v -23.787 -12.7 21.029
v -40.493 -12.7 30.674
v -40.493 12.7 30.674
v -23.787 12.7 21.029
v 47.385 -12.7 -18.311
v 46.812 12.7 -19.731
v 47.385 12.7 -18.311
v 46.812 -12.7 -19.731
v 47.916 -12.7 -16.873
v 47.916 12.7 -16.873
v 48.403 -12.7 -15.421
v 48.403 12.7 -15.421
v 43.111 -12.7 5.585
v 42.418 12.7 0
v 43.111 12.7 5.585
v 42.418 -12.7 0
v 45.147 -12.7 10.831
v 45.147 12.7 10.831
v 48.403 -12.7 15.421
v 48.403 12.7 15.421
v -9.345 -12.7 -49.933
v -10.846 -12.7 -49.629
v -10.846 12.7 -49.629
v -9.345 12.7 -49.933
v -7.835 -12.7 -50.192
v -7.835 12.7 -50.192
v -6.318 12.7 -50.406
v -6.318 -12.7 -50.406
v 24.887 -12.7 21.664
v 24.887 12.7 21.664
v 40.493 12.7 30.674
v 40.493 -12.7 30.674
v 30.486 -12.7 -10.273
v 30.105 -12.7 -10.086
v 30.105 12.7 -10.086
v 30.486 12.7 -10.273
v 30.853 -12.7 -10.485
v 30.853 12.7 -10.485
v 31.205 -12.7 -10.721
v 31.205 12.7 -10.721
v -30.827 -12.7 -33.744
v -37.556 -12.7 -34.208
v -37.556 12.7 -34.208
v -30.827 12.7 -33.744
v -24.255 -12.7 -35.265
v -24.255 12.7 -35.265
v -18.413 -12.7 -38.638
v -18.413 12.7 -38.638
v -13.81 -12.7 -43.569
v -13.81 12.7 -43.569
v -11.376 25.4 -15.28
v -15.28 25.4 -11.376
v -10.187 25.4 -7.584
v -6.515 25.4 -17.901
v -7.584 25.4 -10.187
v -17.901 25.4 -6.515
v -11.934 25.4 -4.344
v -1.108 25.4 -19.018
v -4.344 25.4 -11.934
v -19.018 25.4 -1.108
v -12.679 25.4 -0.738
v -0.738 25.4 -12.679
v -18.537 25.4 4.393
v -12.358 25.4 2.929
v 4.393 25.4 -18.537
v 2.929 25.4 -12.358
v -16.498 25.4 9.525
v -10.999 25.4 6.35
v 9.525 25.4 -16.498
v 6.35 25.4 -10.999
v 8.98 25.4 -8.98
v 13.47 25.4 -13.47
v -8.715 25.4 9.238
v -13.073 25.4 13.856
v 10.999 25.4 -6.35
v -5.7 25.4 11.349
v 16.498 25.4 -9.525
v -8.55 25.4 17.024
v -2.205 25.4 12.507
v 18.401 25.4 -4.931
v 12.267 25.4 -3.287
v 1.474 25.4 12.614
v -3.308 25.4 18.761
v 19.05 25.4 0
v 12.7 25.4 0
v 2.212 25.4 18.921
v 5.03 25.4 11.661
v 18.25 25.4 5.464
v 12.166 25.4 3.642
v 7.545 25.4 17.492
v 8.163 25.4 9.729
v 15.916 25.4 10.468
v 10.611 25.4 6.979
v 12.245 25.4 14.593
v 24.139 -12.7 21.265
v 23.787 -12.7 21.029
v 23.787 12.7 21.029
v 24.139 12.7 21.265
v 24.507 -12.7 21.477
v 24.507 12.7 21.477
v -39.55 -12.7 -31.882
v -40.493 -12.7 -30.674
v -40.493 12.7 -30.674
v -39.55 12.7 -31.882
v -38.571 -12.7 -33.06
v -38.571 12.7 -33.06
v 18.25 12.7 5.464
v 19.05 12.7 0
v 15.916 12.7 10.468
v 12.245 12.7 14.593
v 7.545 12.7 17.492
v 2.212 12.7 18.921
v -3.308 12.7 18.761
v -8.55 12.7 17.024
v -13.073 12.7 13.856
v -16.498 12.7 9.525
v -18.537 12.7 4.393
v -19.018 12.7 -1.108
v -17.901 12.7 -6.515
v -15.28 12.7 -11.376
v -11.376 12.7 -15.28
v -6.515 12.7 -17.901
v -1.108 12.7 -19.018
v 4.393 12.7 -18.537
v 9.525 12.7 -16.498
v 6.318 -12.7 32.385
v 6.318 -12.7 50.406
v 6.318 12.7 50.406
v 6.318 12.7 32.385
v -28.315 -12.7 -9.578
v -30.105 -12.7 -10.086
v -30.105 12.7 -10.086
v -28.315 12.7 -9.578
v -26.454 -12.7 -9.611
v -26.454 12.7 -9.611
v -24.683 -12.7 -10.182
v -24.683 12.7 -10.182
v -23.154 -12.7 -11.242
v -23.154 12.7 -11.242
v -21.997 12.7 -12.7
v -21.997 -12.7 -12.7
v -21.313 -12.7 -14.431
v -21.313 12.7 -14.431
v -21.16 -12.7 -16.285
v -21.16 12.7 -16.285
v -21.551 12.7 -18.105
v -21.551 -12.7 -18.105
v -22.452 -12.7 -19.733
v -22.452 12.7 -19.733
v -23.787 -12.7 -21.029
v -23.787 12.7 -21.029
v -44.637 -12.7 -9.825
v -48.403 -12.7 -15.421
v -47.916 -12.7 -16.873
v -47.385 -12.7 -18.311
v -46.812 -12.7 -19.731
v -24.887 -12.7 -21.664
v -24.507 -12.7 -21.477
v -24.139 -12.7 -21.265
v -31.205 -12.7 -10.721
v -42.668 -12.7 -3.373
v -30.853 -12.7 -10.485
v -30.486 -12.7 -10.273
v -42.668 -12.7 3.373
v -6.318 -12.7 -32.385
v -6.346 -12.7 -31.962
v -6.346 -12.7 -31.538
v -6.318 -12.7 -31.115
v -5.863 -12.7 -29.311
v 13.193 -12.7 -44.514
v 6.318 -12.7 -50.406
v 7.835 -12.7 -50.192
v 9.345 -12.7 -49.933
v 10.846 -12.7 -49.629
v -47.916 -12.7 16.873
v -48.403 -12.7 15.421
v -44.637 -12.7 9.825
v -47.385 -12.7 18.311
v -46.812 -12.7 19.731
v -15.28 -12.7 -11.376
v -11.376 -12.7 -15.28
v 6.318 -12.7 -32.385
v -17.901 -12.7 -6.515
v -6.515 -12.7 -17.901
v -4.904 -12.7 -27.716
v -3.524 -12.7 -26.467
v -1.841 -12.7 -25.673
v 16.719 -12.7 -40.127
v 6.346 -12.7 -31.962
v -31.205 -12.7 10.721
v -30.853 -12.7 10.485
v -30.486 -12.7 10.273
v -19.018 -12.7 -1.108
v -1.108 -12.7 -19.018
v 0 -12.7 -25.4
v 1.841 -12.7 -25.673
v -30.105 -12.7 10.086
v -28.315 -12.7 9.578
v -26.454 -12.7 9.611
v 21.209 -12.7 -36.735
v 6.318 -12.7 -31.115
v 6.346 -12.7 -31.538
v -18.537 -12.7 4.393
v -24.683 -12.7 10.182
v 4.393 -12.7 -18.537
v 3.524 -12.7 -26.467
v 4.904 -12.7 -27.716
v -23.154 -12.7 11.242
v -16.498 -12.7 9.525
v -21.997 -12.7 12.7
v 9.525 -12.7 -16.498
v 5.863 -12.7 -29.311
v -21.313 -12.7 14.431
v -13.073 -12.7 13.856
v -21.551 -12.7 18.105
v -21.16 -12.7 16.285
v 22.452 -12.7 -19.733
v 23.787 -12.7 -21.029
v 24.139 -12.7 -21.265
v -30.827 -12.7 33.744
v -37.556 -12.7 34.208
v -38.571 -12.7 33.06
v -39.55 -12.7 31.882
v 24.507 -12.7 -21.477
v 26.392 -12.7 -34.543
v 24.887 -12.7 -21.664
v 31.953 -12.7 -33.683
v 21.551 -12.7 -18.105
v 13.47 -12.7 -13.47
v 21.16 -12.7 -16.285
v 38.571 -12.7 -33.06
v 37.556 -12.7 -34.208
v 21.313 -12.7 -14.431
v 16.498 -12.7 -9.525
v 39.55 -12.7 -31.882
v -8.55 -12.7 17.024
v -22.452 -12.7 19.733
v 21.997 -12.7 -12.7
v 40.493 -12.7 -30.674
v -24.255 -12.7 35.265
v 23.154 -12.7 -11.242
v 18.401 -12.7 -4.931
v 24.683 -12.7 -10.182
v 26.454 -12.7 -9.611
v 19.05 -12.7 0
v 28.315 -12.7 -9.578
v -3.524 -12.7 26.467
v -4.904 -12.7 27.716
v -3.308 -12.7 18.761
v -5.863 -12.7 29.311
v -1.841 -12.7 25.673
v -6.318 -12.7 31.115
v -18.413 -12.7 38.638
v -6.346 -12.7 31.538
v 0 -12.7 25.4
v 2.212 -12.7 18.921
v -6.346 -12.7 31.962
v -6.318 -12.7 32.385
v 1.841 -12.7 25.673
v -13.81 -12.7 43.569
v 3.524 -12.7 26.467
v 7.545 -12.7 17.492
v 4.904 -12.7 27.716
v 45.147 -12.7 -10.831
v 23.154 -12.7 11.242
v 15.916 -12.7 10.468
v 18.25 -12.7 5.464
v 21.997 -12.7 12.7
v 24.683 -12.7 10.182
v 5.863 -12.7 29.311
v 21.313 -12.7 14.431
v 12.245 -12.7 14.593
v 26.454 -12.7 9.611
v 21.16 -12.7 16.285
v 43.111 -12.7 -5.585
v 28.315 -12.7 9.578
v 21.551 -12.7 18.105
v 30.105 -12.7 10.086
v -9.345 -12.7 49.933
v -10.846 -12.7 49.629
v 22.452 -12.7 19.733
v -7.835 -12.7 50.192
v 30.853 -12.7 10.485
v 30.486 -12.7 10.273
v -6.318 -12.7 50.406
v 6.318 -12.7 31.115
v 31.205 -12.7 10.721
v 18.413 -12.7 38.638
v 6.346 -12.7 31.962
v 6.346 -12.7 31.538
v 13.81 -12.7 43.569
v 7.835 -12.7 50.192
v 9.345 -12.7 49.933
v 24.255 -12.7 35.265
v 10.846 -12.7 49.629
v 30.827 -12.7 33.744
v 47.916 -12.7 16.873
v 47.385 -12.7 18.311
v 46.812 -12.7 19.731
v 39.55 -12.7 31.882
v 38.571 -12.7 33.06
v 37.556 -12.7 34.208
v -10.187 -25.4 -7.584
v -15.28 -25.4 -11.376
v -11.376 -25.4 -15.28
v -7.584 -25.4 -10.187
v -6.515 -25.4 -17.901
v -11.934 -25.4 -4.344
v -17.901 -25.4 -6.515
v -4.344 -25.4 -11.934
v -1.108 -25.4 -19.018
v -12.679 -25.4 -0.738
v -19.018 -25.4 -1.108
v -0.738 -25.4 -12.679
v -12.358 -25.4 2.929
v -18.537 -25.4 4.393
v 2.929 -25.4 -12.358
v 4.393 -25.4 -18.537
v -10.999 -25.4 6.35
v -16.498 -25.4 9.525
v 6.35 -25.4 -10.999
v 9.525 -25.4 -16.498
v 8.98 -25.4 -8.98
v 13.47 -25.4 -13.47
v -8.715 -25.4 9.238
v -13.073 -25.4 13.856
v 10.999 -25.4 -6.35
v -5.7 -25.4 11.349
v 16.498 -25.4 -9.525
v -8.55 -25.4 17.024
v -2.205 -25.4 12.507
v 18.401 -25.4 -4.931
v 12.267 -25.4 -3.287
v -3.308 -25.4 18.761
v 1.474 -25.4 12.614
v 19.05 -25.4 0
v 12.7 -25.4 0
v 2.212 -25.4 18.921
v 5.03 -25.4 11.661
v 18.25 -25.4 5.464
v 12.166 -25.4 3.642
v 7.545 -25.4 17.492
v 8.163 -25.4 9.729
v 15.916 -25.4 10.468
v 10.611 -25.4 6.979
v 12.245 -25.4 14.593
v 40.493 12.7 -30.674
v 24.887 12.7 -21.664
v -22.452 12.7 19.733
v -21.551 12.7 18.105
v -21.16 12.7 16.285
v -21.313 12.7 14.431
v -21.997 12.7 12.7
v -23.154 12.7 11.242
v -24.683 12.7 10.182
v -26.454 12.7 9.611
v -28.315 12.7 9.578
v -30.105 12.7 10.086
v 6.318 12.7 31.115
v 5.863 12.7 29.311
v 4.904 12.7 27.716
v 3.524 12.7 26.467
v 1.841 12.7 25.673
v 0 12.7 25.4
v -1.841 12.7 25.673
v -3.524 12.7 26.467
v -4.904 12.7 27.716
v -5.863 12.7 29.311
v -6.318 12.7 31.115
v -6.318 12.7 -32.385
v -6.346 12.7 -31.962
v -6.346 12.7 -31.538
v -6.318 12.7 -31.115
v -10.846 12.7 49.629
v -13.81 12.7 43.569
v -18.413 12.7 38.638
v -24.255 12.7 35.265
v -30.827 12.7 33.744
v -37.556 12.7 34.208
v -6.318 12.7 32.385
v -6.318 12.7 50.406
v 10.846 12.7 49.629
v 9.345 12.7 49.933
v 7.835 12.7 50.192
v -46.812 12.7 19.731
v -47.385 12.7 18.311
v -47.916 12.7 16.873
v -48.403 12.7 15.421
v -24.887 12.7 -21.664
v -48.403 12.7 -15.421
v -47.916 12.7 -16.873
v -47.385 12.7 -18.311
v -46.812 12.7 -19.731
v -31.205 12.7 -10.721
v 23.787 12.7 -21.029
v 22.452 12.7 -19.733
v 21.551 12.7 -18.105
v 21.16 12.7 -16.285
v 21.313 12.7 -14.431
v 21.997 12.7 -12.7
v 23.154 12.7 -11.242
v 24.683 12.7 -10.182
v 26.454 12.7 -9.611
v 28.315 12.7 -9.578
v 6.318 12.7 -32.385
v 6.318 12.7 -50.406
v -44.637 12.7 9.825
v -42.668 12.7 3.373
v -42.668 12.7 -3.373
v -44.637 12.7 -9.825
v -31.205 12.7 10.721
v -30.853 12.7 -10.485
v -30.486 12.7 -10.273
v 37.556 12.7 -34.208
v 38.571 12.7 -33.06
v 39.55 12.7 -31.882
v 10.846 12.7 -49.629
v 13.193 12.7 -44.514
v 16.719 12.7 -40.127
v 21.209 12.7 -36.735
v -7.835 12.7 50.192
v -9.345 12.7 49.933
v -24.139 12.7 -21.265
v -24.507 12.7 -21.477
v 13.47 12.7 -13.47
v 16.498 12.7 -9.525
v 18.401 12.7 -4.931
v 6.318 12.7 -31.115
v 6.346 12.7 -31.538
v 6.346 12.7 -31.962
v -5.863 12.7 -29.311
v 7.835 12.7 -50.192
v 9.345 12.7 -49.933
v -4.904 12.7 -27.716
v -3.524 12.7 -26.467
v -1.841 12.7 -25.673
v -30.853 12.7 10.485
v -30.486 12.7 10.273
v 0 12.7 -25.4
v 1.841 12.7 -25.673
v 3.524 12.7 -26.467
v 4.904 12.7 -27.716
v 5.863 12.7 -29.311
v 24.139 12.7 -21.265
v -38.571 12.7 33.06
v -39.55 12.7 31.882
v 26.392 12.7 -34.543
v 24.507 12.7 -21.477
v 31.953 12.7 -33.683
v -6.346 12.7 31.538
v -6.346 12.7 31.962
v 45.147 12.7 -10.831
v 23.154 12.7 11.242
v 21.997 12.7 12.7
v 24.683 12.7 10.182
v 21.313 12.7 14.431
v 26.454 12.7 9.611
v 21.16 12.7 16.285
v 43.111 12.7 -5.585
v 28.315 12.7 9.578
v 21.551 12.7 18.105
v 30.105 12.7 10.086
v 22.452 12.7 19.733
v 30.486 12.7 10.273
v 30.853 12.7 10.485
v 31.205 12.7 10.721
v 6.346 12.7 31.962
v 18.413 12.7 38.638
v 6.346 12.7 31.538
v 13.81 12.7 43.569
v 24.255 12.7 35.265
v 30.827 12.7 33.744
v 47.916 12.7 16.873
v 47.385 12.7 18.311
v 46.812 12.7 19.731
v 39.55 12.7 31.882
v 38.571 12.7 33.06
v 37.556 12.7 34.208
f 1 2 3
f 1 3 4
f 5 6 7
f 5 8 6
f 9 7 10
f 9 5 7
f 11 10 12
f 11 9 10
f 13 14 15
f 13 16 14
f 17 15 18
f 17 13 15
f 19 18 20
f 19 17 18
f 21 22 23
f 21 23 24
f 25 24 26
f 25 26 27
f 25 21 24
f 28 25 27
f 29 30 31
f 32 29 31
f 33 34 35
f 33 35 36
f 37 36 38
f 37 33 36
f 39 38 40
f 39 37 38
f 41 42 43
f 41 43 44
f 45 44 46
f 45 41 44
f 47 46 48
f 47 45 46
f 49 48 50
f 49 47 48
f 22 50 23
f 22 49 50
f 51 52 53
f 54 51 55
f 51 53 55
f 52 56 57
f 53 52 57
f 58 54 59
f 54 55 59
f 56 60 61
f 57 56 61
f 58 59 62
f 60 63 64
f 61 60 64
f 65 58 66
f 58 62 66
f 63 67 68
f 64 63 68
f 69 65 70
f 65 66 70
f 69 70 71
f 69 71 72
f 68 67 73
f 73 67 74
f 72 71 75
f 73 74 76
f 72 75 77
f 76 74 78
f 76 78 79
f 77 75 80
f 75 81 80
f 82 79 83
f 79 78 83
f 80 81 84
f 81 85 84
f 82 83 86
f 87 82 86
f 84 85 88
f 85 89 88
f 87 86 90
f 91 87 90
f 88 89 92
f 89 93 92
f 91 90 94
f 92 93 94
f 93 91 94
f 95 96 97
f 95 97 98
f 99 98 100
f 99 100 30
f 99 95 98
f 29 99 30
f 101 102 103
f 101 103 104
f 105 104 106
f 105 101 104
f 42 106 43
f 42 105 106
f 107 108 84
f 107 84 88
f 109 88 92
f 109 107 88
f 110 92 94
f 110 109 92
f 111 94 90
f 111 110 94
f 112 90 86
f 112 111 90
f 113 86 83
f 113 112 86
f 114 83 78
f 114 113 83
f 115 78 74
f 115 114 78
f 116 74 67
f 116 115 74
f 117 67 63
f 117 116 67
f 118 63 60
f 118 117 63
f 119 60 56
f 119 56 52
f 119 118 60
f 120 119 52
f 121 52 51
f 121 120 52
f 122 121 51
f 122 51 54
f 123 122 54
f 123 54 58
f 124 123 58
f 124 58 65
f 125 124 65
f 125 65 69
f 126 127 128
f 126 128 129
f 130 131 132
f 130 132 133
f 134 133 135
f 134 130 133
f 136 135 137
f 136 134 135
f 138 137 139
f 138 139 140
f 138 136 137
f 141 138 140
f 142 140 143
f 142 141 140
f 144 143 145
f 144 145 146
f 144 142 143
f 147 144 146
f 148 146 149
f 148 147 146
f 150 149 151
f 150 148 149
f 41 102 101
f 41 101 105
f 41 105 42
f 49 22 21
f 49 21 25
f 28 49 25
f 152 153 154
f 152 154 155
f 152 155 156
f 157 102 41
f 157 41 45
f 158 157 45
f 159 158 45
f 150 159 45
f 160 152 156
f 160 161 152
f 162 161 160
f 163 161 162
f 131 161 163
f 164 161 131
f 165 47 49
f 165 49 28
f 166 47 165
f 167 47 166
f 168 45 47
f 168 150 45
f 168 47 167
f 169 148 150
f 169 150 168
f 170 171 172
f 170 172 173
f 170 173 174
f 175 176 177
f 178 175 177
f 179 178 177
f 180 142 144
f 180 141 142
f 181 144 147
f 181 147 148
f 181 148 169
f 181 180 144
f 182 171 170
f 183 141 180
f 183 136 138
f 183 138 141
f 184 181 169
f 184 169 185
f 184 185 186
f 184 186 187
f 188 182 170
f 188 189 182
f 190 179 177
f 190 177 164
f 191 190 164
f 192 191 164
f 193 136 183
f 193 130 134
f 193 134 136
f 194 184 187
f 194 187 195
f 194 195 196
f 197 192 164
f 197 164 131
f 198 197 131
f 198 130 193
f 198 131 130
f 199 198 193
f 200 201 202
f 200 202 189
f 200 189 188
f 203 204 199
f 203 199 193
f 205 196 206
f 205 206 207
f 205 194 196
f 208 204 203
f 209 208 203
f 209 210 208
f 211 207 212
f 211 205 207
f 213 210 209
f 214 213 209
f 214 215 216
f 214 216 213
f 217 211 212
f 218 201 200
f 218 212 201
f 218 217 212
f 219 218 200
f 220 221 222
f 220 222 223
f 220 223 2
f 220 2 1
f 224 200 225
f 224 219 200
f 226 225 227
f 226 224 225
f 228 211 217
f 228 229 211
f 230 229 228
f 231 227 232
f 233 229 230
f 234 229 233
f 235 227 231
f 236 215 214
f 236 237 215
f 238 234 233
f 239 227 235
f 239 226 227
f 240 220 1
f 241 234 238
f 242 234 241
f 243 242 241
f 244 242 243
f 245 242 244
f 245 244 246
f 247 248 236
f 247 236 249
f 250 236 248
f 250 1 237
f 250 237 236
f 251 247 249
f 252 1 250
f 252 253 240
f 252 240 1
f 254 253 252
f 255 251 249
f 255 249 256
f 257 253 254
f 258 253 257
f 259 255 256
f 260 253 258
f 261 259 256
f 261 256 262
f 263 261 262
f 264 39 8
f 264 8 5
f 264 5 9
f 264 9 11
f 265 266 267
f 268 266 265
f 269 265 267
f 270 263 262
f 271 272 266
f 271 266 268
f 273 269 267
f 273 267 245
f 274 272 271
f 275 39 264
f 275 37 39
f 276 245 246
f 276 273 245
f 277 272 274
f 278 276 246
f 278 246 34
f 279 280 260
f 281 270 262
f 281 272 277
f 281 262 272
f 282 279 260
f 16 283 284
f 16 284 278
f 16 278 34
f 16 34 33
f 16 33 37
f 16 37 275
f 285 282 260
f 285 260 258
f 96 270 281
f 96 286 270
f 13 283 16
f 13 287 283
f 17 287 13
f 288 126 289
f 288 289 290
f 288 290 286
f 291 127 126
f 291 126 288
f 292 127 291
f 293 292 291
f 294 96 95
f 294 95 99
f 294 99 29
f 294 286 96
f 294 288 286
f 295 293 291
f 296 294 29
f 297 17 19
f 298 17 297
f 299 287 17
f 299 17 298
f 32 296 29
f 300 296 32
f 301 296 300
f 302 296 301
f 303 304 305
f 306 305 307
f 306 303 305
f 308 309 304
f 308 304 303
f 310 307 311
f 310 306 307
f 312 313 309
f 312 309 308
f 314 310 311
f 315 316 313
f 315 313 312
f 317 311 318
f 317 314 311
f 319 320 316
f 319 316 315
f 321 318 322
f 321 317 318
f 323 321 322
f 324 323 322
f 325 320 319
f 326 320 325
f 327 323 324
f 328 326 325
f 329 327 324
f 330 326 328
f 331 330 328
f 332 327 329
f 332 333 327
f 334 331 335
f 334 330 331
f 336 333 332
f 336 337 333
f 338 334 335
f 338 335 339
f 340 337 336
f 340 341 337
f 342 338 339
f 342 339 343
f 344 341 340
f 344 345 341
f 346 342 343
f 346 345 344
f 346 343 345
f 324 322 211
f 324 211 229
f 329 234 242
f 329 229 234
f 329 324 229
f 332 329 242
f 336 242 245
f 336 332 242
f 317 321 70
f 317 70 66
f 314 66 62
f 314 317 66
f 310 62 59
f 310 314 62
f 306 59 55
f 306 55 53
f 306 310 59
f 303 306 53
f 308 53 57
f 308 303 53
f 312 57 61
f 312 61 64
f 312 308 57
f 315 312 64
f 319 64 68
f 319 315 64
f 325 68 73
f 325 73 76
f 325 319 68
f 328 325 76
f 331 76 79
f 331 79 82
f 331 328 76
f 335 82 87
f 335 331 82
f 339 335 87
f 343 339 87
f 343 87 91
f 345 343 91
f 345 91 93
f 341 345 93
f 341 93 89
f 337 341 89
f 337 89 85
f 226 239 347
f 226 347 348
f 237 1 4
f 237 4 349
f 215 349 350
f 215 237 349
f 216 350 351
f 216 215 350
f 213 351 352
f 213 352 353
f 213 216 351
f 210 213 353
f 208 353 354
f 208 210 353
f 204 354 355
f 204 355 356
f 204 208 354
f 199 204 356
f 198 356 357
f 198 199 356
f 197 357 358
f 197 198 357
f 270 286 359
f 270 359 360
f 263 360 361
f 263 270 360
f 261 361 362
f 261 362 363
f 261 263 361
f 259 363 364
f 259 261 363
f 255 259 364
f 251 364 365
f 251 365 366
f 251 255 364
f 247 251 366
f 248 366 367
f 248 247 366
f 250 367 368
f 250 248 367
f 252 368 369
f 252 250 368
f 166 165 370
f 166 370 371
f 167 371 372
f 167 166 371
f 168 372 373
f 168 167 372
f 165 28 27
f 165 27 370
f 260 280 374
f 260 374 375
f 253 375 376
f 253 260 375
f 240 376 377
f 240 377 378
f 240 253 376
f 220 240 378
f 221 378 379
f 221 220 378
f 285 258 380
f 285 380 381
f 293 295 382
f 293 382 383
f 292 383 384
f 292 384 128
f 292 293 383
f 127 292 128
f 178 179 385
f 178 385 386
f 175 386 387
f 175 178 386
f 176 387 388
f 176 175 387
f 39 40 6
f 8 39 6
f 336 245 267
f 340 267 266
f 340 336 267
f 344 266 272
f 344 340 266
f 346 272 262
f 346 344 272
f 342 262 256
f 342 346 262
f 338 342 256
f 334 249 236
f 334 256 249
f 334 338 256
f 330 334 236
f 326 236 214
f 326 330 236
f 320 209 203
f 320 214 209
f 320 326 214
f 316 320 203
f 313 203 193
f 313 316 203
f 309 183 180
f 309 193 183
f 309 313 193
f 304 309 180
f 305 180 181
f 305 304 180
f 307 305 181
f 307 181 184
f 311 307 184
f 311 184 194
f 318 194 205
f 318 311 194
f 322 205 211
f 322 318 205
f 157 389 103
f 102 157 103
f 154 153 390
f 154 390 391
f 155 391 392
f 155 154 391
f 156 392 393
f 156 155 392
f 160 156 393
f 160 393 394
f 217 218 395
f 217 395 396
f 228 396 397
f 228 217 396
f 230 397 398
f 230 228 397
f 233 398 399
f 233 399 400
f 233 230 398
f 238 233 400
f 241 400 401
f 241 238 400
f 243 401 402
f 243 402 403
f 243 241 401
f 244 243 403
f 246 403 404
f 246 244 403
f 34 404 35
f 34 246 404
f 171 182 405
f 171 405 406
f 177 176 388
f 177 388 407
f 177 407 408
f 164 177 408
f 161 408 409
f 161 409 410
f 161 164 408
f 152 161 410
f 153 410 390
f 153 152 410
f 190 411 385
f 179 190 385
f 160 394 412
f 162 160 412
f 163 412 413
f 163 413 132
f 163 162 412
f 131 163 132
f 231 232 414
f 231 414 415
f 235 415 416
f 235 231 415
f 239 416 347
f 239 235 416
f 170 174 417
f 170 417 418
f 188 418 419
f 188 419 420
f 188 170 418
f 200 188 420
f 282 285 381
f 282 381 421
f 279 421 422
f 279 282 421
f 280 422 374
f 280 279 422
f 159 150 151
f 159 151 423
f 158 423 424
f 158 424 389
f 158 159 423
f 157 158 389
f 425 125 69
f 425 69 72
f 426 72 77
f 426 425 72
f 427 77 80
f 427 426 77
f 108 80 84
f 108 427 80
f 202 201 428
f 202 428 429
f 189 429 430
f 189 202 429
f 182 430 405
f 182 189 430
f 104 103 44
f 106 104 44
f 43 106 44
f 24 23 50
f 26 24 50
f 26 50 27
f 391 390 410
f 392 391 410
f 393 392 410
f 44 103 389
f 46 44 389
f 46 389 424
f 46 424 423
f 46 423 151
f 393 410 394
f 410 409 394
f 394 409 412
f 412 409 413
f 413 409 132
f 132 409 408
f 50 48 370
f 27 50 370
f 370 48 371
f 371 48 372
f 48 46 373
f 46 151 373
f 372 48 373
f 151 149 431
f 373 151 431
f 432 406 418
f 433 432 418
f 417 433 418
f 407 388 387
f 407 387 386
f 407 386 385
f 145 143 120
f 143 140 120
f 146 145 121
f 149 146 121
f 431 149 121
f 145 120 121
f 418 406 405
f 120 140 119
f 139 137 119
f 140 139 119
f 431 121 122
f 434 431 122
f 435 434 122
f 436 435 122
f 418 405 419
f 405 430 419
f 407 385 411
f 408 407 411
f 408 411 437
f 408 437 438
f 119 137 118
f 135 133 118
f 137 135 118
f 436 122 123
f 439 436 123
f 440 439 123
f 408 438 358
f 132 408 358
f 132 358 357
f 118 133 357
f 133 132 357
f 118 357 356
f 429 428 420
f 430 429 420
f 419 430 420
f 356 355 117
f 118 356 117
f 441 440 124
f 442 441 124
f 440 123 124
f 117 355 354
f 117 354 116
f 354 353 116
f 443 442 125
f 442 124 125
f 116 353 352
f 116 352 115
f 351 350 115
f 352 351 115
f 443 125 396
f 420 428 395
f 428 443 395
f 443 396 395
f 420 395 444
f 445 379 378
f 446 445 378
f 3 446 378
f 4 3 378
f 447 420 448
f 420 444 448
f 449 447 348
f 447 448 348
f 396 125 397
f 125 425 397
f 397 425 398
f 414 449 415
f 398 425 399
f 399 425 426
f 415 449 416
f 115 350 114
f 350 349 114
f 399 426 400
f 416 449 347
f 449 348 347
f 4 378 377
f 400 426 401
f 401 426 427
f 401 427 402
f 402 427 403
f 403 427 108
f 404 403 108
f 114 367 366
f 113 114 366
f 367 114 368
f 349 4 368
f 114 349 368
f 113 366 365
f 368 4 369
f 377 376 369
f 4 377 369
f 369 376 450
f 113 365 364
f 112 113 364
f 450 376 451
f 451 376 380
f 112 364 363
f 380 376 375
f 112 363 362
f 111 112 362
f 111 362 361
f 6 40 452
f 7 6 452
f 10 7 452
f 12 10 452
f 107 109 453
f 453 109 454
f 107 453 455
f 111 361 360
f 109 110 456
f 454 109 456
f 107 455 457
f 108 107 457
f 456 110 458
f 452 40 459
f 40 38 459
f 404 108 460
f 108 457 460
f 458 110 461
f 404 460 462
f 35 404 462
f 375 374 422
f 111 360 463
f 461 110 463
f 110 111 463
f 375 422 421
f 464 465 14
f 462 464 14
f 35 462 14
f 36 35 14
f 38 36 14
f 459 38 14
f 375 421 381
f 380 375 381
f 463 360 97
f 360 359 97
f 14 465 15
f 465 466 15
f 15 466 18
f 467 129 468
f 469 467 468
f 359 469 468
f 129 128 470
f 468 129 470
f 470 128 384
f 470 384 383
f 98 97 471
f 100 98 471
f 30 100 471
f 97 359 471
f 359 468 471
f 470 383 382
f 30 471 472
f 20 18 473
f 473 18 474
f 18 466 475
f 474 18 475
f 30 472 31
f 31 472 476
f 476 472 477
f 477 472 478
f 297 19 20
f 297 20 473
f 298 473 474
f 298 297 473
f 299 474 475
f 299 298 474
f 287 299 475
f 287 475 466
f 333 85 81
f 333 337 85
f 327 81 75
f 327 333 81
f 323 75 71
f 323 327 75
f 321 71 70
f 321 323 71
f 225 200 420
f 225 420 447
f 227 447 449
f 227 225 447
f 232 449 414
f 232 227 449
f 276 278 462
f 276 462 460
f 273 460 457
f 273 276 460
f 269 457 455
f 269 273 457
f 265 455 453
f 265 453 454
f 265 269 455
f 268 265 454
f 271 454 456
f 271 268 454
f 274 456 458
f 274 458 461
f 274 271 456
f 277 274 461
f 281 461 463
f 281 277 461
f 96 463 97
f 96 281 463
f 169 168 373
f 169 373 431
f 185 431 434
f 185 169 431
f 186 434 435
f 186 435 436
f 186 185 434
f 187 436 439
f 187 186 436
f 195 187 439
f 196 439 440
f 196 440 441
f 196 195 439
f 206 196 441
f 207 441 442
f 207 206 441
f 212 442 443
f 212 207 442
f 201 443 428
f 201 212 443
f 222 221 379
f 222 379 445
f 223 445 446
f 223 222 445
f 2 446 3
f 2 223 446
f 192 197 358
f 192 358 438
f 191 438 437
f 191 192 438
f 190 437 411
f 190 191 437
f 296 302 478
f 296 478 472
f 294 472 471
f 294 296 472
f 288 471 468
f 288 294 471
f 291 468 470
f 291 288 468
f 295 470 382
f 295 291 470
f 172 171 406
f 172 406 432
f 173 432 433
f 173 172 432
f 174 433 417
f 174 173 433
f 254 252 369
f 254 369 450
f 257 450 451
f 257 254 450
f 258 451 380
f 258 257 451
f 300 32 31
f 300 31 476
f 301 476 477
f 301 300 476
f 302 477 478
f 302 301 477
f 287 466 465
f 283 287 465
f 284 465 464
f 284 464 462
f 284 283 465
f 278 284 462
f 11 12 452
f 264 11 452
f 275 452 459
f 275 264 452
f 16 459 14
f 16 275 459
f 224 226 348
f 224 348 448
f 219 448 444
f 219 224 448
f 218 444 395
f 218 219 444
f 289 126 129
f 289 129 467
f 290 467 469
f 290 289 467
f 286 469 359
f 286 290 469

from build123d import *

# Parameters (mm, degrees)
F1_DEPTH = 12.7
F2_DEPTH = 25.4


with BuildPart() as f1:
    # F0 (on Front) → F1 (new body, symmetric)
    with BuildSketch(Plane.XZ):
        with BuildLine():
            ThreePointArc((42.418, 0), (43.966661, 8.270817), (48.402813, 15.421014))
            ThreePointArc((48.402813, 15.421014), (47.655949, 17.594048), (46.811583, 19.731085))
            Line((46.811583, 19.731085), (31.205318, 10.720804))
            ThreePointArc((31.205318, 10.720804), (30.671307, 10.375739), (30.105466, 10.085804))
            ThreePointArc((30.105466, 10.085804), (21.997045, 12.7), (23.787295, 21.029196))
            ThreePointArc((23.787295, 21.029196), (24.321307, 21.374261), (24.887148, 21.664196))
            Line((24.887148, 21.664196), (40.493412, 30.674477))
            ThreePointArc((40.493412, 30.674477), (39.064867, 32.474238), (37.556396, 34.207559))
            ThreePointArc((37.556396, 34.207559), (21.209, 36.735066), (10.846417, 49.628573))
            ThreePointArc((10.846417, 49.628573), (8.591082, 50.068286), (6.31817, 50.405562))
            Line((6.31817, 50.405562), (6.31817, 32.385))
            ThreePointArc((6.31817, 32.385), (6.35, 31.75), (6.31817, 31.115))
            ThreePointArc((6.31817, 31.115), (0, 25.4), (-6.31817, 31.115))
            ThreePointArc((-6.31817, 31.115), (-6.35, 31.75), (-6.31817, 32.385))
            Line((-6.31817, 32.385), (-6.31817, 50.405562))
            ThreePointArc((-6.31817, 50.405562), (-8.591082, 50.068286), (-10.846417, 49.628573))
            ThreePointArc((-10.846417, 49.628573), (-21.209, 36.735066), (-37.556396, 34.207559))
            ThreePointArc((-37.556396, 34.207559), (-39.064867, 32.474238), (-40.493412, 30.674477))
            Line((-40.493412, 30.674477), (-23.787295, 21.029196))
            ThreePointArc((-23.787295, 21.029196), (-21.997045, 12.7), (-30.105466, 10.085804))
            ThreePointArc((-30.105466, 10.085804), (-30.671307, 10.375739), (-31.205318, 10.720804))
            Line((-31.205318, 10.720804), (-46.811583, 19.731085))
            ThreePointArc((-46.811583, 19.731085), (-47.655949, 17.594048), (-48.402813, 15.421014))
            ThreePointArc((-48.402813, 15.421014), (-42.418, 0), (-48.402813, -15.421014))
            ThreePointArc((-48.402813, -15.421014), (-47.655949, -17.594048), (-46.811583, -19.731085))
            Line((-46.811583, -19.731085), (-31.205318, -10.720804))
            ThreePointArc((-31.205318, -10.720804), (-30.671307, -10.375739), (-30.105466, -10.085804))
            ThreePointArc((-30.105466, -10.085804), (-21.997045, -12.7), (-23.787295, -21.029196))
            ThreePointArc((-23.787295, -21.029196), (-24.321307, -21.374261), (-24.887148, -21.664196))
            Line((-24.887148, -21.664196), (-40.493412, -30.674477))
            ThreePointArc((-40.493412, -30.674477), (-39.064867, -32.474238), (-37.556396, -34.207559))
            ThreePointArc((-37.556396, -34.207559), (-21.209, -36.735066), (-10.846417, -49.628573))
            ThreePointArc((-10.846417, -49.628573), (-8.591082, -50.068286), (-6.31817, -50.405562))
            Line((-6.31817, -50.405562), (-6.31817, -32.385))
            ThreePointArc((-6.31817, -32.385), (-6.35, -31.75), (-6.31817, -31.115))
            ThreePointArc((-6.31817, -31.115), (0, -25.4), (6.31817, -31.115))
            ThreePointArc((6.31817, -31.115), (6.35, -31.75), (6.31817, -32.385))
            Line((6.31817, -32.385), (6.31817, -50.405562))
            ThreePointArc((6.31817, -50.405562), (8.591082, -50.068286), (10.846417, -49.628573))
            ThreePointArc((10.846417, -49.628573), (14.820593, -42.211654), (21.209, -36.735066))
            Line((21.209, -36.735066), (9.525, -16.497784))
            ThreePointArc((9.525, -16.497784), (-16.497784, 9.525), (19.05, 0))
            Line((19.05, 0), (42.418, 0))
        make_face()
        with BuildLine():
            ThreePointArc((48.402813, -15.421014), (43.966661, -8.270817), (42.418, 0))
            Line((42.418, 0), (19.05, 0))
            ThreePointArc((19.05, 0), (16.497784, -9.525), (9.525, -16.497784))
            Line((9.525, -16.497784), (21.209, -36.735066))
            ThreePointArc((21.209, -36.735066), (29.146068, -33.940837), (37.556396, -34.207559))
            ThreePointArc((37.556396, -34.207559), (39.064867, -32.474238), (40.493412, -30.674477))
            Line((40.493412, -30.674477), (24.887148, -21.664196))
            ThreePointArc((24.887148, -21.664196), (24.321307, -21.374261), (23.787295, -21.029196))
            ThreePointArc((23.787295, -21.029196), (21.997045, -12.7), (30.105466, -10.085804))
            ThreePointArc((30.105466, -10.085804), (30.671307, -10.375739), (31.205318, -10.720804))
            Line((31.205318, -10.720804), (46.811583, -19.731085))
            ThreePointArc((46.811583, -19.731085), (47.655949, -17.594048), (48.402813, -15.421014))
        make_face()
    extrude(amount=F1_DEPTH, both=True)

    # F0 (on Front) → F2 (join, symmetric)
    with BuildSketch(Plane.XZ):
        with BuildLine():
            ThreePointArc((9.525, -16.497784), (16.497784, -9.525), (19.05, 0))
            Line((19.05, 0), (12.7, 0))
            ThreePointArc((12.7, 0), (10.998523, -6.35), (6.35, -10.998523))
            Line((6.35, -10.998523), (9.525, -16.497784))
        make_face()
        with BuildLine():
            Line((12.7, 0), (19.05, 0))
            ThreePointArc((19.05, 0), (-16.497784, 9.525), (9.525, -16.497784))
            Line((9.525, -16.497784), (6.35, -10.998523))
            ThreePointArc((6.35, -10.998523), (-10.998523, 6.35), (12.7, 0))
        make_face()
    extrude(amount=F2_DEPTH, both=True)


solid = f1.part
